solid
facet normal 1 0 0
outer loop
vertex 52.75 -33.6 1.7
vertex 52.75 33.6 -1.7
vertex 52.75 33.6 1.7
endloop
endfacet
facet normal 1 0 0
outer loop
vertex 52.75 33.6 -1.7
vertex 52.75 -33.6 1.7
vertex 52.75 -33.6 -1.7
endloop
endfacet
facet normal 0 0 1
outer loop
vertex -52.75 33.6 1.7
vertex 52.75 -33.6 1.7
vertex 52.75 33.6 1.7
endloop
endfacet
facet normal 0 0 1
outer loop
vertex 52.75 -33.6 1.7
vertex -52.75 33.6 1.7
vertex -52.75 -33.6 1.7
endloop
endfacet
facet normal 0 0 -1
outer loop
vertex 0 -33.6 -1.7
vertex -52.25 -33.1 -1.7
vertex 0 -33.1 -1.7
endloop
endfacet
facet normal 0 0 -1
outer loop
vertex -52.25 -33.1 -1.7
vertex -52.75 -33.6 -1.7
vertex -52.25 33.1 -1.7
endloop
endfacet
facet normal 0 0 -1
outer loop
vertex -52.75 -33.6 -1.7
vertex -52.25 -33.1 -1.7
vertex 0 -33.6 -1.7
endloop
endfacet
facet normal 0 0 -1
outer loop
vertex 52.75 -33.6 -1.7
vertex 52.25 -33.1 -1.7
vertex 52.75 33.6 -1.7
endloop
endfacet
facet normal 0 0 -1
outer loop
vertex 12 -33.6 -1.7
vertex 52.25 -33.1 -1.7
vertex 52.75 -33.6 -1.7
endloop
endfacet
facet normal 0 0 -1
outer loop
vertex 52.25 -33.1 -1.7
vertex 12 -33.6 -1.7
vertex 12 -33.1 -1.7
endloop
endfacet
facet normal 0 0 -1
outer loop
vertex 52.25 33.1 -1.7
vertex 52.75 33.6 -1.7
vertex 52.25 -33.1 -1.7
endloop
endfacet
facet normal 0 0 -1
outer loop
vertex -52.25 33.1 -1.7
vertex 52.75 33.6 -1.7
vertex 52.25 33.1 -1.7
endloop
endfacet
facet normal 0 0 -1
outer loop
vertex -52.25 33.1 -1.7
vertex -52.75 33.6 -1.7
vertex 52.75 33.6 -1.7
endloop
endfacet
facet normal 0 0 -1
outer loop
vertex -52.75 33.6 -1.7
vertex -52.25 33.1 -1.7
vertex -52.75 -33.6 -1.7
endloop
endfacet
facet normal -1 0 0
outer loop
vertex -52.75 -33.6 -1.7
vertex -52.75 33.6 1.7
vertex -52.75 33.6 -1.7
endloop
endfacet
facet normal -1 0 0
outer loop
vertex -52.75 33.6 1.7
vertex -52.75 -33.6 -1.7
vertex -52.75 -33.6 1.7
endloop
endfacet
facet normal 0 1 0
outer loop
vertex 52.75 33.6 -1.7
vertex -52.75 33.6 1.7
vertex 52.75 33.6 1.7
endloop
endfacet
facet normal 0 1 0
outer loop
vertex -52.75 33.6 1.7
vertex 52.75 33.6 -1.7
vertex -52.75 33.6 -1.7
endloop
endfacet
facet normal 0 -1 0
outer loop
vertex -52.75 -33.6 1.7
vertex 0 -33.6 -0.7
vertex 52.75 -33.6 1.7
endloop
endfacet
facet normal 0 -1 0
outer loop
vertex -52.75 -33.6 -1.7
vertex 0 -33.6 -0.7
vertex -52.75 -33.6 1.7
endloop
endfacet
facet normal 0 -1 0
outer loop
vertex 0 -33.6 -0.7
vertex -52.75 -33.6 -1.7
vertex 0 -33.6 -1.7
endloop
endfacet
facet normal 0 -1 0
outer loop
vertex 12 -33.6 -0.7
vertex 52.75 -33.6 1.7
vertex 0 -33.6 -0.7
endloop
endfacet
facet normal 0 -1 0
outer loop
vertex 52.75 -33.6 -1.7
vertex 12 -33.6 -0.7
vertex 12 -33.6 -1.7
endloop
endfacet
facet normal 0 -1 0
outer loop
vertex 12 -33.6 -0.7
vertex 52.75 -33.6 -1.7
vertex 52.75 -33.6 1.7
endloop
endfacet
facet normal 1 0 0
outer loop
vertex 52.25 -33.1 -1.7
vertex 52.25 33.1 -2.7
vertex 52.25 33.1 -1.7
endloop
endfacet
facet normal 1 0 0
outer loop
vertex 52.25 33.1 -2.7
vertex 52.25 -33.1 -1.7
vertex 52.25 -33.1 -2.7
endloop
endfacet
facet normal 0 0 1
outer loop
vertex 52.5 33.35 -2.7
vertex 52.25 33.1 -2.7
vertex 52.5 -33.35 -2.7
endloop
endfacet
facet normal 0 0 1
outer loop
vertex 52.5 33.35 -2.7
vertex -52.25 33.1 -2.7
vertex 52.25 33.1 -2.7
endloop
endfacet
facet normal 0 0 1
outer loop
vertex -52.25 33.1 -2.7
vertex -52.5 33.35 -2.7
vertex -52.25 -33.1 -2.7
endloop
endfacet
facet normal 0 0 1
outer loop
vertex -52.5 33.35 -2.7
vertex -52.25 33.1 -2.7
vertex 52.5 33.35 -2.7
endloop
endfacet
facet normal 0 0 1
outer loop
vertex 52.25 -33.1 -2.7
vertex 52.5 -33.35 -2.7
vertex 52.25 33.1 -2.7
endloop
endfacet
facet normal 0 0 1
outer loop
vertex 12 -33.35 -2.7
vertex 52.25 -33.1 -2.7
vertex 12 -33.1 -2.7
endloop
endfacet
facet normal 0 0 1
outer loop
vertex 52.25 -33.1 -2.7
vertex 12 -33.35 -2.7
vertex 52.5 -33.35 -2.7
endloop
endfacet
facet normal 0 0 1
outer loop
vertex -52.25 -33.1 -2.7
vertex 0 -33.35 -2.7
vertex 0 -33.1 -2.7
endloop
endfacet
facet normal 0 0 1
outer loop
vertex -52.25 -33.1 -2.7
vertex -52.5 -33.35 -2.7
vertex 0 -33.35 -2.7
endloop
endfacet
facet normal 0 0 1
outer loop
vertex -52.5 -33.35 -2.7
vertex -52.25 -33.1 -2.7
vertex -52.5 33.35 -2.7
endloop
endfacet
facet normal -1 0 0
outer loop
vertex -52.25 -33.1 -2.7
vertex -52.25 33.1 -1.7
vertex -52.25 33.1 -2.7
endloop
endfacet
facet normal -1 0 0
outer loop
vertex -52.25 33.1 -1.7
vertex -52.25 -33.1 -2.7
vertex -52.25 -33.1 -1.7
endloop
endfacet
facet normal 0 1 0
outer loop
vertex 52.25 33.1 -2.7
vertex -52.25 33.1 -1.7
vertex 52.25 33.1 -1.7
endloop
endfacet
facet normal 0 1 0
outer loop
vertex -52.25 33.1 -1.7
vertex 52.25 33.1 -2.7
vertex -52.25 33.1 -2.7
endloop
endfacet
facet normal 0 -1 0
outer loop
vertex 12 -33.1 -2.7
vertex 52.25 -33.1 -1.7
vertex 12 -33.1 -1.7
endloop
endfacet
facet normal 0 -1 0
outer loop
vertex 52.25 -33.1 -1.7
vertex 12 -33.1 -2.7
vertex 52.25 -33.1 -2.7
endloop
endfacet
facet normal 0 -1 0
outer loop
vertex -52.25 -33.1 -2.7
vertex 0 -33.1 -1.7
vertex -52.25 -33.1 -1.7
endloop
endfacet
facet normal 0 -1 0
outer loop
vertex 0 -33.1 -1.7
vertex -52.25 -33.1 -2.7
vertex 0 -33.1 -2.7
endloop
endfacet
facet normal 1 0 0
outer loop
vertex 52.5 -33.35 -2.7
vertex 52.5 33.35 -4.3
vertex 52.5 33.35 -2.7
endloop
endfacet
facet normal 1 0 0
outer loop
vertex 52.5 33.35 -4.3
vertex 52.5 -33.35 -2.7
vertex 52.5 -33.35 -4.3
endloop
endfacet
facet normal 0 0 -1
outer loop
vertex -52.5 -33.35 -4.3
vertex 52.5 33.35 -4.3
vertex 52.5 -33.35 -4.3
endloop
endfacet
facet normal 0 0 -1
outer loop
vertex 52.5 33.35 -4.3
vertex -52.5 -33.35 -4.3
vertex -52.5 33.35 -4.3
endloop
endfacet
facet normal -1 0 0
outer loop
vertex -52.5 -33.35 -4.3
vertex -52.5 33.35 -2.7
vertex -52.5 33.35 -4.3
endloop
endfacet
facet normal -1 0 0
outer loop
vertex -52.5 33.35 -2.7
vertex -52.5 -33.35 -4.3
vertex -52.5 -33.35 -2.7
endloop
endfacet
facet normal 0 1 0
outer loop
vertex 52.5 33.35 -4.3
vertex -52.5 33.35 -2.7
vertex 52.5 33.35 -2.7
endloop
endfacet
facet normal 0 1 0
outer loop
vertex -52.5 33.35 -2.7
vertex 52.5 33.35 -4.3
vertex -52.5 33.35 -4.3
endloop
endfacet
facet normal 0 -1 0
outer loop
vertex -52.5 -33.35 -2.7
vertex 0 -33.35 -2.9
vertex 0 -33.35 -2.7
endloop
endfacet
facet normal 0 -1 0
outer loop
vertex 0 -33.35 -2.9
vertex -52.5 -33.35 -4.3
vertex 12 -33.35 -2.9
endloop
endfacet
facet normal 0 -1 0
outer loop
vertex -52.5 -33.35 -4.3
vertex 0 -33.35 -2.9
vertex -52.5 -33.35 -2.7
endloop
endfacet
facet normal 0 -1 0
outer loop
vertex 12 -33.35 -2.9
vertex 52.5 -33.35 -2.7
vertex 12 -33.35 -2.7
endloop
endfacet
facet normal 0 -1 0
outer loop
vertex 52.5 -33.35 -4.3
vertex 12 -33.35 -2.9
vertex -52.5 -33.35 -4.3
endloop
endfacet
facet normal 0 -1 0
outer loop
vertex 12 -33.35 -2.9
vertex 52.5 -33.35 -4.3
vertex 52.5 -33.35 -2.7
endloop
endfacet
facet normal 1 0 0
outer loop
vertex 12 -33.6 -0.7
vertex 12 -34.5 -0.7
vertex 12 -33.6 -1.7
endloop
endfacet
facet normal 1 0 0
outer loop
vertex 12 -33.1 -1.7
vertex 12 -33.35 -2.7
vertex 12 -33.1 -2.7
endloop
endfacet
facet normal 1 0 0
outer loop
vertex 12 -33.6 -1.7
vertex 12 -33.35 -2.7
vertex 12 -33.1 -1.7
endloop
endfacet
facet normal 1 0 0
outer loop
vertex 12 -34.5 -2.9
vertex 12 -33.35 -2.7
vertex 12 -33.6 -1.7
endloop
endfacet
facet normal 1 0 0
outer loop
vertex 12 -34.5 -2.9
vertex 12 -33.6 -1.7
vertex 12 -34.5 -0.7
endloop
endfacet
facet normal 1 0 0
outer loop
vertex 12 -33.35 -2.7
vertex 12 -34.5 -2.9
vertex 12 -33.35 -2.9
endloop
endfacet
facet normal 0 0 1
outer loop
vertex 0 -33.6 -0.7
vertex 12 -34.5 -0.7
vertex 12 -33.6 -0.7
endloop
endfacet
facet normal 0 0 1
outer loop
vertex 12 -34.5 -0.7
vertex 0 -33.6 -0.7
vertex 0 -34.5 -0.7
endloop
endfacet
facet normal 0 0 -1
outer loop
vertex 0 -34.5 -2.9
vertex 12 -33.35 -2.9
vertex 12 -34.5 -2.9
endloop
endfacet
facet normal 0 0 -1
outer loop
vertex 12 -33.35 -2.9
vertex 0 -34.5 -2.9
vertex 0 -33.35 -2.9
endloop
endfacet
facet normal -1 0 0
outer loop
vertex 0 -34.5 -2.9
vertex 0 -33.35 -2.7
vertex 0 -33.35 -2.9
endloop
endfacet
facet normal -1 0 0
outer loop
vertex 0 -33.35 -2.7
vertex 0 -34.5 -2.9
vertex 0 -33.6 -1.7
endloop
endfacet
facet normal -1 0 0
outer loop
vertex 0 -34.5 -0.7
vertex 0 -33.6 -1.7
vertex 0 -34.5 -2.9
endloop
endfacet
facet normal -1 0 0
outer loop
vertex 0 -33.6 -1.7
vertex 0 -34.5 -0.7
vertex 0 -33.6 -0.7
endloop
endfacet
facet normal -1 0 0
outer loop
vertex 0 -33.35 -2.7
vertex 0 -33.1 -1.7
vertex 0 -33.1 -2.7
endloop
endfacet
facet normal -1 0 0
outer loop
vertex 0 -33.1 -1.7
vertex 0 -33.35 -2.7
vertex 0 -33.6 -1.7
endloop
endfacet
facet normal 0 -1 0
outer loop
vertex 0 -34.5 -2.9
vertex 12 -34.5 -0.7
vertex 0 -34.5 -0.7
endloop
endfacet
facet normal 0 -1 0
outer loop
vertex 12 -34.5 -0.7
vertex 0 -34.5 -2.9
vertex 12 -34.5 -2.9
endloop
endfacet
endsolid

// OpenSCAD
// Parameters
display_width = 105.5; //[52.75:211:0.1]
display_height = 67.2; //[33.6:134.4:0.1]
display_thickness = 3.4; //[1.7:6.8:0.1]
aperture_min_x = -50; //[-100:0:0.1]
aperture_min_y = -26.5; //[-67.2:0:0.1]
aperture_max_x = 50; //[0:100:0.1]
aperture_max_y = 31.5; //[0:67.2:0.1]
aperture_depth = 0.5; //[0.2:3.4:0.1]
touchscreen_min_x = -52.75; //[-105.5:0:0.1]
touchscreen_min_y = -31.5; //[-67.2:0:0.1]
touchscreen_max_x = 52.75; //[0:105.5:0.1]
touchscreen_max_y = 33.5; //[0:67.2:0.1]
touchscreen_thickness = 1; //[0.3:2.5:0.1]
touchscreen_enabled = 1; //[0:1:1]
pcb_width = 105; //[52.5:210:0.1]
pcb_height = 66.7; //[33.35:133.4:0.1]
pcb_thickness = 1.6; //[0.8:3.2:0.1]
display_pcb_offset_x = 0; //[-20:20:0.1]
display_pcb_offset_y = 0; //[-20:20:0.1]
display_pcb_offset_z = 0; //[-10:20:0.1]
pcb_offset_gap = 2; //[0:10:0.1]
bottom_conn_min_x = 0; //[-52.75:52.75:0.1]
bottom_conn_min_y = -34.5; //[-67.2:0:0.1]
bottom_conn_max_x = 12; //[-52.75:52.75:0.1]
bottom_conn_max_y = -31.5; //[-67.2:0:0.1]
bottom_connector_thickness = 2.2; //[1:6:0.1]
overlap = 1; //[0.5:2:0.1]
eps = 0.2; //[0.05:0.5:0.05]

// Display module with detailed geometry
module display() {
  color([0.85, 0.85, 0.8]) {
    // Display body with aperture cutout
    difference() {
      cube([display_width, display_height, display_thickness], center=true);
      translate([aperture_min_x, aperture_min_y, display_thickness/2 - aperture_depth])
        cube([aperture_max_x - aperture_min_x, aperture_max_y - aperture_min_y, aperture_depth + eps], center=false);
    }
    
    // Touchscreen layer
    if (touchscreen_enabled) {
      translate([touchscreen_min_x, touchscreen_min_y, display_thickness/2 - overlap])
        cube([touchscreen_max_x - touchscreen_min_x, touchscreen_max_y - touchscreen_min_y, touchscreen_thickness], center=false);
    }
    
    // PCB offset gap
    translate([0, 0, -display_thickness/2 - pcb_offset_gap/2 + overlap])
      cube([display_width - 1, display_height - 1, pcb_offset_gap], center=true);
    
    // PCB block
    translate([display_pcb_offset_x, display_pcb_offset_y, -display_thickness/2 - pcb_offset_gap - pcb_thickness/2 + overlap + display_pcb_offset_z])
      cube([pcb_width, pcb_height, pcb_thickness], center=true);
    
    // Bottom connector region
    translate([bottom_conn_min_x, bottom_conn_min_y, -display_thickness/2 - bottom_connector_thickness + overlap])
      cube([bottom_conn_max_x - bottom_conn_min_x, bottom_conn_max_y - bottom_conn_min_y, bottom_connector_thickness], center=false);
  }
}

// Assembly
module assembly() {
  display();
}

assembly();
